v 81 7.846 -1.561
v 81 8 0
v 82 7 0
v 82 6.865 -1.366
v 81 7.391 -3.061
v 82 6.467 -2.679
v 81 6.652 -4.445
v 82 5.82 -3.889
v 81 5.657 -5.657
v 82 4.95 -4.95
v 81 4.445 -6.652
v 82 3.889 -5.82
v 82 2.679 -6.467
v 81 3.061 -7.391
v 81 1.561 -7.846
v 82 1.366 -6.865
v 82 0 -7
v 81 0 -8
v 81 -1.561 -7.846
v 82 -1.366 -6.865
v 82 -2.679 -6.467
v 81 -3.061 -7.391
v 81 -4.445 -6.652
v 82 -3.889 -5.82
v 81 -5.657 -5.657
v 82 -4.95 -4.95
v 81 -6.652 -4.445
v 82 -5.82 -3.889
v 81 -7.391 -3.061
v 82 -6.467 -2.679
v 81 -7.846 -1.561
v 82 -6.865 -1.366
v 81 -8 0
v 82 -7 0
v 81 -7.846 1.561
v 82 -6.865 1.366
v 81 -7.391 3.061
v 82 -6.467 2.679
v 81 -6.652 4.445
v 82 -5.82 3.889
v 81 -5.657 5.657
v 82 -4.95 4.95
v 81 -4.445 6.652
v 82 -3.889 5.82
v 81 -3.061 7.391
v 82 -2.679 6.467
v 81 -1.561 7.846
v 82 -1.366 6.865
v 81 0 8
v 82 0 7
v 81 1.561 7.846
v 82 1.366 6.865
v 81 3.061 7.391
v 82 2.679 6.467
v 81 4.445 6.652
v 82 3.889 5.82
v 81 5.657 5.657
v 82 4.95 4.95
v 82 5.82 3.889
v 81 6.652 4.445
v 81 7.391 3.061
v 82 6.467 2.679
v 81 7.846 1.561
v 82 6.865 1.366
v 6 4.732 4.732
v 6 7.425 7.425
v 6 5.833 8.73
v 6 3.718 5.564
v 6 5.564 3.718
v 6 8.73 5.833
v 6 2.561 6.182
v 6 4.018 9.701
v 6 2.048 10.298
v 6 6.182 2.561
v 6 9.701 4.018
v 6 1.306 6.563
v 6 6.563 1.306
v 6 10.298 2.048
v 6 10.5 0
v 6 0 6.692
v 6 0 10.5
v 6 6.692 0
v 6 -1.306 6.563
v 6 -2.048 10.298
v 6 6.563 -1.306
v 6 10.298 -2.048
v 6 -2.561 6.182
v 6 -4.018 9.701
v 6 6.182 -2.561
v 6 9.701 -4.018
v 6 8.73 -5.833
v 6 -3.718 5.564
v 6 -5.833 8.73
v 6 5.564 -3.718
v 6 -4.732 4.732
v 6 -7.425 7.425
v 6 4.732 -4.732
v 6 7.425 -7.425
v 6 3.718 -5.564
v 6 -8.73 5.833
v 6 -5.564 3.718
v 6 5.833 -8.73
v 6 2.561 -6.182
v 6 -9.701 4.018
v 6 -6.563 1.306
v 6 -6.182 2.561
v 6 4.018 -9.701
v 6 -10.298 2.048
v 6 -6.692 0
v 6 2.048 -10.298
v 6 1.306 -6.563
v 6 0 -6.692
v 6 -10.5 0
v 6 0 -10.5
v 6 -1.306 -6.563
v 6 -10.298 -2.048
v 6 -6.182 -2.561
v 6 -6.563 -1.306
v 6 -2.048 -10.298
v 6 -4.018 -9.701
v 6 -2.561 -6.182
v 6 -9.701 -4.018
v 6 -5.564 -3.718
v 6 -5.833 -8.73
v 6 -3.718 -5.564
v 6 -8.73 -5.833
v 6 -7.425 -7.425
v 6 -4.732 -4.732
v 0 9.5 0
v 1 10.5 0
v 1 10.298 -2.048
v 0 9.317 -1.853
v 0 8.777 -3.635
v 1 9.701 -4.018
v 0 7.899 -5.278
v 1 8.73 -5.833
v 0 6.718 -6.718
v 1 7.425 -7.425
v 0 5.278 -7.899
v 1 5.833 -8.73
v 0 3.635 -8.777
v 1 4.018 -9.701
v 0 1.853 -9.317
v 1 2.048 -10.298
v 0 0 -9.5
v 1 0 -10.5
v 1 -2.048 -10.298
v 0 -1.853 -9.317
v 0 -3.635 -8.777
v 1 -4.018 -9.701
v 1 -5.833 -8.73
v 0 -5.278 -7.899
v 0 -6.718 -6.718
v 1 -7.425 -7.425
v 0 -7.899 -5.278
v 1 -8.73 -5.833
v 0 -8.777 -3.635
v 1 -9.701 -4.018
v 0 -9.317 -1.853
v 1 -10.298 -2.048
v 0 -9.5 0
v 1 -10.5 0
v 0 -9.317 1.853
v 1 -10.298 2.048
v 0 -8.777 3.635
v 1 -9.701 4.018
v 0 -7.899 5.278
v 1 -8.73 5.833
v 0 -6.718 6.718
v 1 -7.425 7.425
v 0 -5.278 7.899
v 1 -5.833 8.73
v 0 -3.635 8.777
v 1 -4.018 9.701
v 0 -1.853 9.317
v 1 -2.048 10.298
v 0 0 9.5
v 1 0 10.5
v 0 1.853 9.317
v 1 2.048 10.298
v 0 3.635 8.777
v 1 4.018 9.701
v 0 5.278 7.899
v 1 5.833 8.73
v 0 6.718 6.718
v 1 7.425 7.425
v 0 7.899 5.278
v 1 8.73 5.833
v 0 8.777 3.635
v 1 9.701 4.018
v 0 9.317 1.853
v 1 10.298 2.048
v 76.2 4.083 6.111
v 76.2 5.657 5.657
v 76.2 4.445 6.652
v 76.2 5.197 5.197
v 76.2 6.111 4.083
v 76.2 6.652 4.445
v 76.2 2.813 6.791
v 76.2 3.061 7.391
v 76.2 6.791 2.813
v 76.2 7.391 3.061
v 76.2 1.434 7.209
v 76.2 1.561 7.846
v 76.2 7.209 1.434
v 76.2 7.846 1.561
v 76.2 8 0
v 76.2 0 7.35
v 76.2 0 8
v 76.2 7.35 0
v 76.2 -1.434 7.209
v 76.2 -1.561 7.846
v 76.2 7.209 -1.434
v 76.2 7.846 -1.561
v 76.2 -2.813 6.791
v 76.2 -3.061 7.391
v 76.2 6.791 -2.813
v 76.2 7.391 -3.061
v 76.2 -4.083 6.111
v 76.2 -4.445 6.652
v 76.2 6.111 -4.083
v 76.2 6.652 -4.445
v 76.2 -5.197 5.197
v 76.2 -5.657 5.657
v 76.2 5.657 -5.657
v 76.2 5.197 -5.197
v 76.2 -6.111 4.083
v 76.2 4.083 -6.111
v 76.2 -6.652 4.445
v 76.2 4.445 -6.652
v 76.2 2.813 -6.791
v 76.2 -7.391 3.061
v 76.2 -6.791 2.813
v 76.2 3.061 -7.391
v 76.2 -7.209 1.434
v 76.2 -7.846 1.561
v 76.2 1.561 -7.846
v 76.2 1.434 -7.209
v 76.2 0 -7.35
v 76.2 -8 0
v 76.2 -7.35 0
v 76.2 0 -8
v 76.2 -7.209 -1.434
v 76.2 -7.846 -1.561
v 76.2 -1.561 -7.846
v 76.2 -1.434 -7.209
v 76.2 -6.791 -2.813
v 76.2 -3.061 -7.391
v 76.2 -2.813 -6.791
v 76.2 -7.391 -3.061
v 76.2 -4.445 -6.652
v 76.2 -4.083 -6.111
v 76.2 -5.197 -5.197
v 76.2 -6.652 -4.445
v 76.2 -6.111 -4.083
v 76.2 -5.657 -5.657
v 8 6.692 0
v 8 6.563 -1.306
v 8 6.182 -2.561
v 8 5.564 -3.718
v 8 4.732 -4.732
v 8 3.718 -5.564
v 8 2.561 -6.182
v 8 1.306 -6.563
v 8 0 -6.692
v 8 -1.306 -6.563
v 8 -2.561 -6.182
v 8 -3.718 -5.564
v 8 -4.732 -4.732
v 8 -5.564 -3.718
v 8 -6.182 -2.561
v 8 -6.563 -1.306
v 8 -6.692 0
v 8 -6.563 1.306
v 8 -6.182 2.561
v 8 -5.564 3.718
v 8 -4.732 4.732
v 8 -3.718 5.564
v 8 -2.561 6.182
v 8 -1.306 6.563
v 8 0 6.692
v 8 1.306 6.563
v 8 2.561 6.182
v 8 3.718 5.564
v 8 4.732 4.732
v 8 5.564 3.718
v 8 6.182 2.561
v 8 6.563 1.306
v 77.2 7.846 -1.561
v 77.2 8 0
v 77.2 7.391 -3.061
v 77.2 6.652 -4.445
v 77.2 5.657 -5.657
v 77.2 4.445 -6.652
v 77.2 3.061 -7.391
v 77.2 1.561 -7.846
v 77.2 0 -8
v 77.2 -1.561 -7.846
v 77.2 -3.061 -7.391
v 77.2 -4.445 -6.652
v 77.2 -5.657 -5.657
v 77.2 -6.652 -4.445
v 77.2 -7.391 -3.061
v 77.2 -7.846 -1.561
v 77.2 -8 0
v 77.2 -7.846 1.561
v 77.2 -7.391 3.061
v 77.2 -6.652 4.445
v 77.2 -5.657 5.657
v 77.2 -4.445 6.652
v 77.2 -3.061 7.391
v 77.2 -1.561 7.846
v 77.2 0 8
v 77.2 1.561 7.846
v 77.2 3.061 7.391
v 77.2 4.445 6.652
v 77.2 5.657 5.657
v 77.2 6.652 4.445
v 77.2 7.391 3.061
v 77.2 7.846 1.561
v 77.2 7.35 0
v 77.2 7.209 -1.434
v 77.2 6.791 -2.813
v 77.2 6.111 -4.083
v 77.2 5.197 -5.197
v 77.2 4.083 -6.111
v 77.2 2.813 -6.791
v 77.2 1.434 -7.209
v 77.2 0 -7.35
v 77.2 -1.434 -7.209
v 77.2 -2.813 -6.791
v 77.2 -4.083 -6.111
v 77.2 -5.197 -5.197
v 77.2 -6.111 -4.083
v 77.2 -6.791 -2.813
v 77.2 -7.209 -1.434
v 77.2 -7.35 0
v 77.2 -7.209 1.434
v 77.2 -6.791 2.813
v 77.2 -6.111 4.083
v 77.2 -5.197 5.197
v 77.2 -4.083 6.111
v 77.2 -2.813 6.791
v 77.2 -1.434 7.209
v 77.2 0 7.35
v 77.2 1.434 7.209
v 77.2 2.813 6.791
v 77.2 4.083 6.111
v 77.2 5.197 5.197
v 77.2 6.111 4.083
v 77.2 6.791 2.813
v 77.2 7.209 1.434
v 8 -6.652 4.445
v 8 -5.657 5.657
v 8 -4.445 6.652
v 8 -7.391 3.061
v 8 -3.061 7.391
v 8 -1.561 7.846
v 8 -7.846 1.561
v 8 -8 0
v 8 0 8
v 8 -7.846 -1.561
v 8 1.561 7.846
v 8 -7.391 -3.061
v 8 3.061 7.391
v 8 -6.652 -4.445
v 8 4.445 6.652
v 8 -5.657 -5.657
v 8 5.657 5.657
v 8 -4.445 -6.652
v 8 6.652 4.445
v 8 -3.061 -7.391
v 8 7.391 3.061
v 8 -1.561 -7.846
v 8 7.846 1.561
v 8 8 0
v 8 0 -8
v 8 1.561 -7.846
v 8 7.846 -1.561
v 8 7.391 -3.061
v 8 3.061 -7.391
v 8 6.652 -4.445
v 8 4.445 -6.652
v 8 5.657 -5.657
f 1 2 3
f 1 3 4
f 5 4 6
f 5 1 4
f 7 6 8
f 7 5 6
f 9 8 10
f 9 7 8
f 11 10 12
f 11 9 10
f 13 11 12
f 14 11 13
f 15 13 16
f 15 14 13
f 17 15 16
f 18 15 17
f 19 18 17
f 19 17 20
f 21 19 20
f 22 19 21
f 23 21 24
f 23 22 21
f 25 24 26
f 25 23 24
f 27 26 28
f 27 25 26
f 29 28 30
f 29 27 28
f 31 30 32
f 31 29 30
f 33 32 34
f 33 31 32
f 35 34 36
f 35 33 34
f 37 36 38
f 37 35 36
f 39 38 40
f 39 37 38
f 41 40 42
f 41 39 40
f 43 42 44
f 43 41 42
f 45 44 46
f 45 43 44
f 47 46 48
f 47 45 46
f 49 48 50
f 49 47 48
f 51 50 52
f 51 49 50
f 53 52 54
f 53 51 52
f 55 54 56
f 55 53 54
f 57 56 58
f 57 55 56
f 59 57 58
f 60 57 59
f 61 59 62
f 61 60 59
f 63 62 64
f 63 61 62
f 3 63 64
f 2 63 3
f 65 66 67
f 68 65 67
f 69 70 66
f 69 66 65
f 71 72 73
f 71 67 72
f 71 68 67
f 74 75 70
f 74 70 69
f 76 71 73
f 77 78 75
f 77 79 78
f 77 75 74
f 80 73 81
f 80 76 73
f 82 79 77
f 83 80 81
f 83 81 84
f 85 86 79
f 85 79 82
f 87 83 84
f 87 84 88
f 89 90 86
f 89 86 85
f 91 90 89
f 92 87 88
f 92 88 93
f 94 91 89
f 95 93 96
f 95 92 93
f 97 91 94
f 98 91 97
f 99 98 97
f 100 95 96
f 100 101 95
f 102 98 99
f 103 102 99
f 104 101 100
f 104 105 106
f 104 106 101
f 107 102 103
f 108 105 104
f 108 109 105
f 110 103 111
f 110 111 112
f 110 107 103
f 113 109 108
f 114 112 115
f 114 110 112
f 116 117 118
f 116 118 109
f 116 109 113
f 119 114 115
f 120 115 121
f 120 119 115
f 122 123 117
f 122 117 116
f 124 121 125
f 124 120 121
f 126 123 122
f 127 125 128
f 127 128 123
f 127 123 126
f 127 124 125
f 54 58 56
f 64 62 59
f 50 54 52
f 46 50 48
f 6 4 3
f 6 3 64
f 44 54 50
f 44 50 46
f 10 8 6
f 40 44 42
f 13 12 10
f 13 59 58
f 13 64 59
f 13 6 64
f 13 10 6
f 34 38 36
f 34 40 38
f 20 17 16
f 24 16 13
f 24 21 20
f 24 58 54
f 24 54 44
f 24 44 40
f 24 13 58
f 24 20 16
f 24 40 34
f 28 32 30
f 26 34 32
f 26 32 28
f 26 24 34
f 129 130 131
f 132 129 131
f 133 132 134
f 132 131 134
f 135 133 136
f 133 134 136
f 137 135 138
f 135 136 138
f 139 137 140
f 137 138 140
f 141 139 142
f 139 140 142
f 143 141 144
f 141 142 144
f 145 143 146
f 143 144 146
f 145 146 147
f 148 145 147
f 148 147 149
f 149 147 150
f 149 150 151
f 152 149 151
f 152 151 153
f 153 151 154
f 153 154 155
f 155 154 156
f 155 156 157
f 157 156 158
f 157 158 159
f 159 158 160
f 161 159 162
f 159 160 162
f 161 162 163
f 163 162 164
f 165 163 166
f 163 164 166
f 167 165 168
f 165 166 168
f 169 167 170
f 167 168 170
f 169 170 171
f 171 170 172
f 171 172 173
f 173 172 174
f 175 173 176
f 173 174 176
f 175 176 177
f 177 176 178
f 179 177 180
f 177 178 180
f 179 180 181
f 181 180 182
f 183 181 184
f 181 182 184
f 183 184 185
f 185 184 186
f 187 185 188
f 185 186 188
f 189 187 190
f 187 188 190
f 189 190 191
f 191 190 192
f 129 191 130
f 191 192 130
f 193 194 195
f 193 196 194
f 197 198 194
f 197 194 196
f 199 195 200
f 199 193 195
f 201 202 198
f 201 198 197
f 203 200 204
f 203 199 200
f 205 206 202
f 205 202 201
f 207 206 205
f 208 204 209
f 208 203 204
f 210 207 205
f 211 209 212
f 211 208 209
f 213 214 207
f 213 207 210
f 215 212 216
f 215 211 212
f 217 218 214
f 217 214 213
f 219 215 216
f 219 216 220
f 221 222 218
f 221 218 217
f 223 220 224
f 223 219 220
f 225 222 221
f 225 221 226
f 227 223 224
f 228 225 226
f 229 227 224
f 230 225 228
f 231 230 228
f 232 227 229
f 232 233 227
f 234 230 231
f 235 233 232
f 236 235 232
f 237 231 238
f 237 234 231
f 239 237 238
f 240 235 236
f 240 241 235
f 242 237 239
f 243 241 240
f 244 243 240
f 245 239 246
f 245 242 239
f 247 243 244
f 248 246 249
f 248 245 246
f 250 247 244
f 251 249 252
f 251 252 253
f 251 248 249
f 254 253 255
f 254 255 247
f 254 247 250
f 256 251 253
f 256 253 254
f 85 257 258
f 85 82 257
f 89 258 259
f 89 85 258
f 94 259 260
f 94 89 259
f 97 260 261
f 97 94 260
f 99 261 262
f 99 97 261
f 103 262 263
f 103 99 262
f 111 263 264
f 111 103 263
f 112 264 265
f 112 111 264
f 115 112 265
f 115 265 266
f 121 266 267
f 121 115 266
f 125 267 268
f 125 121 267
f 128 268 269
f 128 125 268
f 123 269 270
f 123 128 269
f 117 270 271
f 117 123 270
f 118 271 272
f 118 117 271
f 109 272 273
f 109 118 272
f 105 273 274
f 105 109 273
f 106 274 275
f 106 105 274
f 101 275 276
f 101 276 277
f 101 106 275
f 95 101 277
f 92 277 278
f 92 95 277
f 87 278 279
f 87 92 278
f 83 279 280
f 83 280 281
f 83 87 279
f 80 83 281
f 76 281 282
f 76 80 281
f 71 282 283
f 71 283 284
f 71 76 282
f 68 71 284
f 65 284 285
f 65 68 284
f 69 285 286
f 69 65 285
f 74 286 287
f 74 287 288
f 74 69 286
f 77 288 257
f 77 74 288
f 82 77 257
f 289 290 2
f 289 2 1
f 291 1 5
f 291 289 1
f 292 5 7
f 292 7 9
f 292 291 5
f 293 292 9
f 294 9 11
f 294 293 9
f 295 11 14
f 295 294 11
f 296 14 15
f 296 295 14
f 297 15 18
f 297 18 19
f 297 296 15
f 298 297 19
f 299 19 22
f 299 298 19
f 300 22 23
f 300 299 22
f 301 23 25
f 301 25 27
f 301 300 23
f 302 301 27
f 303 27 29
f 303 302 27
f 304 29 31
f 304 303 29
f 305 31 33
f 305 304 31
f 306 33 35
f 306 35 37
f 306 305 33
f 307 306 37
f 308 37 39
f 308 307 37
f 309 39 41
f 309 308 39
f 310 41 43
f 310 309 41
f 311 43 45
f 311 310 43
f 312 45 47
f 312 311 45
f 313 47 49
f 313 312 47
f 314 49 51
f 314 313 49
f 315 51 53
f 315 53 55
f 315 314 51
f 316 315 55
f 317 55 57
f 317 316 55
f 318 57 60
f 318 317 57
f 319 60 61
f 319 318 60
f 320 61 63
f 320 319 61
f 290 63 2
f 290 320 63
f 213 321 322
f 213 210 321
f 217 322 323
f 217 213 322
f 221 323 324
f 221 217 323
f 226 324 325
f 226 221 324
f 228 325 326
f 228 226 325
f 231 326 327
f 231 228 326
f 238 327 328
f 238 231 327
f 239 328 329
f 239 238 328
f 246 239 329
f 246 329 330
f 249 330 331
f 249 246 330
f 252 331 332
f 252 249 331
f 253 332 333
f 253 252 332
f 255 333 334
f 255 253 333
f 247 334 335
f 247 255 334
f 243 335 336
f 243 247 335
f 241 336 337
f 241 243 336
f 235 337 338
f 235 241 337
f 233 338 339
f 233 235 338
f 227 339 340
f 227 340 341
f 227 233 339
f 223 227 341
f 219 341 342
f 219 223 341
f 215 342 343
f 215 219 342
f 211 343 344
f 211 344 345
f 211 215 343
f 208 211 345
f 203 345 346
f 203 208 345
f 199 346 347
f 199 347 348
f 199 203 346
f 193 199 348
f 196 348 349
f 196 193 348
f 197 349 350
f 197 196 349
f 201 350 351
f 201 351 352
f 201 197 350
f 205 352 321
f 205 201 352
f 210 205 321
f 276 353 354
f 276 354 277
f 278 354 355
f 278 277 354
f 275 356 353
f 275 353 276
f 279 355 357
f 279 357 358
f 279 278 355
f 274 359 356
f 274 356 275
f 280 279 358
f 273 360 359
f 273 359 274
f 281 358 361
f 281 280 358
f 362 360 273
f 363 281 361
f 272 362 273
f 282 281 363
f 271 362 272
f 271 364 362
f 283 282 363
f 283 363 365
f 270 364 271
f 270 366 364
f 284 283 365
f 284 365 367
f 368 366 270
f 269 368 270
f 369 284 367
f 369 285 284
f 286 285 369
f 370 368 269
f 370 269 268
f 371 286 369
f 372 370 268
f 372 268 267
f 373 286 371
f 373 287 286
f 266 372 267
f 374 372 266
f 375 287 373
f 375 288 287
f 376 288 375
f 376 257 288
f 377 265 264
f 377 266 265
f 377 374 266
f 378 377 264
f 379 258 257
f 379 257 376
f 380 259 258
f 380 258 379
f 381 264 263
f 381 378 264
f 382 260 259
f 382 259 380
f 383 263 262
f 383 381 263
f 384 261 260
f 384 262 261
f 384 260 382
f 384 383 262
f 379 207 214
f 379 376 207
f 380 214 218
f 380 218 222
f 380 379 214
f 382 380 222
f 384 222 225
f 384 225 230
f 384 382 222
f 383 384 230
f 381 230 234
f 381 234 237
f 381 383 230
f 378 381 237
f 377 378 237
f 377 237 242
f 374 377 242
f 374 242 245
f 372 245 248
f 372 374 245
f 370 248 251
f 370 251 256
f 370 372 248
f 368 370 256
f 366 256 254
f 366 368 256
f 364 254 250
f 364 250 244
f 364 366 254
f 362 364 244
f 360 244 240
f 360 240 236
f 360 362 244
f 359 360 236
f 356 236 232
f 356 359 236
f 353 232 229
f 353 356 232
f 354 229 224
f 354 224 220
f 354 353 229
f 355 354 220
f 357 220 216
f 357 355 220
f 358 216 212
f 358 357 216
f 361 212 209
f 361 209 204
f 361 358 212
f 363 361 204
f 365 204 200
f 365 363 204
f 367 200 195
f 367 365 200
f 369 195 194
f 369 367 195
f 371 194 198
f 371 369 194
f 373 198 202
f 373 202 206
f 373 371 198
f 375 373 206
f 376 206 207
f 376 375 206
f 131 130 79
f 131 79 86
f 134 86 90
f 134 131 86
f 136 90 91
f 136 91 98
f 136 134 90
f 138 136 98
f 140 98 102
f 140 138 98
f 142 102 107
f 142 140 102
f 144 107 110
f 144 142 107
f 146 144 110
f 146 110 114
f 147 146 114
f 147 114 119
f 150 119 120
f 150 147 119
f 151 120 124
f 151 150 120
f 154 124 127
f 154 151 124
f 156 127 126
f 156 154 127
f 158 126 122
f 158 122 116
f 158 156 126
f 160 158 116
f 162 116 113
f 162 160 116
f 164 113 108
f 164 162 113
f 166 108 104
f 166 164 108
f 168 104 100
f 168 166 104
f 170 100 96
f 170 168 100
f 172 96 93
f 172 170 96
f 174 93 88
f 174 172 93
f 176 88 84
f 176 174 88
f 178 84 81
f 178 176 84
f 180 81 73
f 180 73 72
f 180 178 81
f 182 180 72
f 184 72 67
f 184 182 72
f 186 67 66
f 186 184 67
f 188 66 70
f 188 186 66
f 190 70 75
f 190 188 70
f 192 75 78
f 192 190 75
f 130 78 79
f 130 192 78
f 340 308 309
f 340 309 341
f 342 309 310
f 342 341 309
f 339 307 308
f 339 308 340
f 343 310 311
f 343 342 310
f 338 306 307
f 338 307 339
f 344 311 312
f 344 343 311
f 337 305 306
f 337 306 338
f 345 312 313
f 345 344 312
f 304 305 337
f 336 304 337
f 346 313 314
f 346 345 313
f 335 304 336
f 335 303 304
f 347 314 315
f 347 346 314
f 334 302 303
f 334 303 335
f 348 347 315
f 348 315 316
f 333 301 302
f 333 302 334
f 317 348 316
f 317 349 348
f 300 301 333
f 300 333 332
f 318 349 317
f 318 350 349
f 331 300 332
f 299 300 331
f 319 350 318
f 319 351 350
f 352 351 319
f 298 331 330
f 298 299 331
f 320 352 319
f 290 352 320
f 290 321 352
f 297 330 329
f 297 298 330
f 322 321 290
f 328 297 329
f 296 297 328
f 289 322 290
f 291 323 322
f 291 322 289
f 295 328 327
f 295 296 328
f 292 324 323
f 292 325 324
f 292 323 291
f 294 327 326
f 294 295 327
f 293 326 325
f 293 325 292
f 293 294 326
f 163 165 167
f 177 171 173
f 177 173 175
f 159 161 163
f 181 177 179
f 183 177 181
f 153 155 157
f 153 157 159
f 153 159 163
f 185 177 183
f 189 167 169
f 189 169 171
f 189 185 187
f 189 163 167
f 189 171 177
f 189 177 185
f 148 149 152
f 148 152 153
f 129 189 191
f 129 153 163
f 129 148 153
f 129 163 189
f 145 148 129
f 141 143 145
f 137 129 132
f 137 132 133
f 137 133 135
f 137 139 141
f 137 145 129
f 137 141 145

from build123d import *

# Parameters (mm, degrees)
CHAMFER_1_SIZE = 1


with BuildPart() as part:
    # 草图1 → 旋转1 (revolve)
    with BuildSketch(Plane.XY):
        Polygon((0, 10.5), (0, 0), (82, 0), (82, 8), (77.2, 8), (77.2, 7.35), (76.2, 7.35), (76.2, 8), (8, 8), (8, 6.691876128), (6, 6.691876128), (6, 8), (6, 10.5), align=None)
    revolve(axis=Axis((82, 0, 0), (-1, 0, 0)))

    # 倒角1
    chamfer_1_edges = [part.edges().sort_by_distance(p)[0] for p in [
        (82, -8, 0),
        (0, -10.5, 0),
    ]]
    chamfer(chamfer_1_edges, length=CHAMFER_1_SIZE)


solid = part.part
